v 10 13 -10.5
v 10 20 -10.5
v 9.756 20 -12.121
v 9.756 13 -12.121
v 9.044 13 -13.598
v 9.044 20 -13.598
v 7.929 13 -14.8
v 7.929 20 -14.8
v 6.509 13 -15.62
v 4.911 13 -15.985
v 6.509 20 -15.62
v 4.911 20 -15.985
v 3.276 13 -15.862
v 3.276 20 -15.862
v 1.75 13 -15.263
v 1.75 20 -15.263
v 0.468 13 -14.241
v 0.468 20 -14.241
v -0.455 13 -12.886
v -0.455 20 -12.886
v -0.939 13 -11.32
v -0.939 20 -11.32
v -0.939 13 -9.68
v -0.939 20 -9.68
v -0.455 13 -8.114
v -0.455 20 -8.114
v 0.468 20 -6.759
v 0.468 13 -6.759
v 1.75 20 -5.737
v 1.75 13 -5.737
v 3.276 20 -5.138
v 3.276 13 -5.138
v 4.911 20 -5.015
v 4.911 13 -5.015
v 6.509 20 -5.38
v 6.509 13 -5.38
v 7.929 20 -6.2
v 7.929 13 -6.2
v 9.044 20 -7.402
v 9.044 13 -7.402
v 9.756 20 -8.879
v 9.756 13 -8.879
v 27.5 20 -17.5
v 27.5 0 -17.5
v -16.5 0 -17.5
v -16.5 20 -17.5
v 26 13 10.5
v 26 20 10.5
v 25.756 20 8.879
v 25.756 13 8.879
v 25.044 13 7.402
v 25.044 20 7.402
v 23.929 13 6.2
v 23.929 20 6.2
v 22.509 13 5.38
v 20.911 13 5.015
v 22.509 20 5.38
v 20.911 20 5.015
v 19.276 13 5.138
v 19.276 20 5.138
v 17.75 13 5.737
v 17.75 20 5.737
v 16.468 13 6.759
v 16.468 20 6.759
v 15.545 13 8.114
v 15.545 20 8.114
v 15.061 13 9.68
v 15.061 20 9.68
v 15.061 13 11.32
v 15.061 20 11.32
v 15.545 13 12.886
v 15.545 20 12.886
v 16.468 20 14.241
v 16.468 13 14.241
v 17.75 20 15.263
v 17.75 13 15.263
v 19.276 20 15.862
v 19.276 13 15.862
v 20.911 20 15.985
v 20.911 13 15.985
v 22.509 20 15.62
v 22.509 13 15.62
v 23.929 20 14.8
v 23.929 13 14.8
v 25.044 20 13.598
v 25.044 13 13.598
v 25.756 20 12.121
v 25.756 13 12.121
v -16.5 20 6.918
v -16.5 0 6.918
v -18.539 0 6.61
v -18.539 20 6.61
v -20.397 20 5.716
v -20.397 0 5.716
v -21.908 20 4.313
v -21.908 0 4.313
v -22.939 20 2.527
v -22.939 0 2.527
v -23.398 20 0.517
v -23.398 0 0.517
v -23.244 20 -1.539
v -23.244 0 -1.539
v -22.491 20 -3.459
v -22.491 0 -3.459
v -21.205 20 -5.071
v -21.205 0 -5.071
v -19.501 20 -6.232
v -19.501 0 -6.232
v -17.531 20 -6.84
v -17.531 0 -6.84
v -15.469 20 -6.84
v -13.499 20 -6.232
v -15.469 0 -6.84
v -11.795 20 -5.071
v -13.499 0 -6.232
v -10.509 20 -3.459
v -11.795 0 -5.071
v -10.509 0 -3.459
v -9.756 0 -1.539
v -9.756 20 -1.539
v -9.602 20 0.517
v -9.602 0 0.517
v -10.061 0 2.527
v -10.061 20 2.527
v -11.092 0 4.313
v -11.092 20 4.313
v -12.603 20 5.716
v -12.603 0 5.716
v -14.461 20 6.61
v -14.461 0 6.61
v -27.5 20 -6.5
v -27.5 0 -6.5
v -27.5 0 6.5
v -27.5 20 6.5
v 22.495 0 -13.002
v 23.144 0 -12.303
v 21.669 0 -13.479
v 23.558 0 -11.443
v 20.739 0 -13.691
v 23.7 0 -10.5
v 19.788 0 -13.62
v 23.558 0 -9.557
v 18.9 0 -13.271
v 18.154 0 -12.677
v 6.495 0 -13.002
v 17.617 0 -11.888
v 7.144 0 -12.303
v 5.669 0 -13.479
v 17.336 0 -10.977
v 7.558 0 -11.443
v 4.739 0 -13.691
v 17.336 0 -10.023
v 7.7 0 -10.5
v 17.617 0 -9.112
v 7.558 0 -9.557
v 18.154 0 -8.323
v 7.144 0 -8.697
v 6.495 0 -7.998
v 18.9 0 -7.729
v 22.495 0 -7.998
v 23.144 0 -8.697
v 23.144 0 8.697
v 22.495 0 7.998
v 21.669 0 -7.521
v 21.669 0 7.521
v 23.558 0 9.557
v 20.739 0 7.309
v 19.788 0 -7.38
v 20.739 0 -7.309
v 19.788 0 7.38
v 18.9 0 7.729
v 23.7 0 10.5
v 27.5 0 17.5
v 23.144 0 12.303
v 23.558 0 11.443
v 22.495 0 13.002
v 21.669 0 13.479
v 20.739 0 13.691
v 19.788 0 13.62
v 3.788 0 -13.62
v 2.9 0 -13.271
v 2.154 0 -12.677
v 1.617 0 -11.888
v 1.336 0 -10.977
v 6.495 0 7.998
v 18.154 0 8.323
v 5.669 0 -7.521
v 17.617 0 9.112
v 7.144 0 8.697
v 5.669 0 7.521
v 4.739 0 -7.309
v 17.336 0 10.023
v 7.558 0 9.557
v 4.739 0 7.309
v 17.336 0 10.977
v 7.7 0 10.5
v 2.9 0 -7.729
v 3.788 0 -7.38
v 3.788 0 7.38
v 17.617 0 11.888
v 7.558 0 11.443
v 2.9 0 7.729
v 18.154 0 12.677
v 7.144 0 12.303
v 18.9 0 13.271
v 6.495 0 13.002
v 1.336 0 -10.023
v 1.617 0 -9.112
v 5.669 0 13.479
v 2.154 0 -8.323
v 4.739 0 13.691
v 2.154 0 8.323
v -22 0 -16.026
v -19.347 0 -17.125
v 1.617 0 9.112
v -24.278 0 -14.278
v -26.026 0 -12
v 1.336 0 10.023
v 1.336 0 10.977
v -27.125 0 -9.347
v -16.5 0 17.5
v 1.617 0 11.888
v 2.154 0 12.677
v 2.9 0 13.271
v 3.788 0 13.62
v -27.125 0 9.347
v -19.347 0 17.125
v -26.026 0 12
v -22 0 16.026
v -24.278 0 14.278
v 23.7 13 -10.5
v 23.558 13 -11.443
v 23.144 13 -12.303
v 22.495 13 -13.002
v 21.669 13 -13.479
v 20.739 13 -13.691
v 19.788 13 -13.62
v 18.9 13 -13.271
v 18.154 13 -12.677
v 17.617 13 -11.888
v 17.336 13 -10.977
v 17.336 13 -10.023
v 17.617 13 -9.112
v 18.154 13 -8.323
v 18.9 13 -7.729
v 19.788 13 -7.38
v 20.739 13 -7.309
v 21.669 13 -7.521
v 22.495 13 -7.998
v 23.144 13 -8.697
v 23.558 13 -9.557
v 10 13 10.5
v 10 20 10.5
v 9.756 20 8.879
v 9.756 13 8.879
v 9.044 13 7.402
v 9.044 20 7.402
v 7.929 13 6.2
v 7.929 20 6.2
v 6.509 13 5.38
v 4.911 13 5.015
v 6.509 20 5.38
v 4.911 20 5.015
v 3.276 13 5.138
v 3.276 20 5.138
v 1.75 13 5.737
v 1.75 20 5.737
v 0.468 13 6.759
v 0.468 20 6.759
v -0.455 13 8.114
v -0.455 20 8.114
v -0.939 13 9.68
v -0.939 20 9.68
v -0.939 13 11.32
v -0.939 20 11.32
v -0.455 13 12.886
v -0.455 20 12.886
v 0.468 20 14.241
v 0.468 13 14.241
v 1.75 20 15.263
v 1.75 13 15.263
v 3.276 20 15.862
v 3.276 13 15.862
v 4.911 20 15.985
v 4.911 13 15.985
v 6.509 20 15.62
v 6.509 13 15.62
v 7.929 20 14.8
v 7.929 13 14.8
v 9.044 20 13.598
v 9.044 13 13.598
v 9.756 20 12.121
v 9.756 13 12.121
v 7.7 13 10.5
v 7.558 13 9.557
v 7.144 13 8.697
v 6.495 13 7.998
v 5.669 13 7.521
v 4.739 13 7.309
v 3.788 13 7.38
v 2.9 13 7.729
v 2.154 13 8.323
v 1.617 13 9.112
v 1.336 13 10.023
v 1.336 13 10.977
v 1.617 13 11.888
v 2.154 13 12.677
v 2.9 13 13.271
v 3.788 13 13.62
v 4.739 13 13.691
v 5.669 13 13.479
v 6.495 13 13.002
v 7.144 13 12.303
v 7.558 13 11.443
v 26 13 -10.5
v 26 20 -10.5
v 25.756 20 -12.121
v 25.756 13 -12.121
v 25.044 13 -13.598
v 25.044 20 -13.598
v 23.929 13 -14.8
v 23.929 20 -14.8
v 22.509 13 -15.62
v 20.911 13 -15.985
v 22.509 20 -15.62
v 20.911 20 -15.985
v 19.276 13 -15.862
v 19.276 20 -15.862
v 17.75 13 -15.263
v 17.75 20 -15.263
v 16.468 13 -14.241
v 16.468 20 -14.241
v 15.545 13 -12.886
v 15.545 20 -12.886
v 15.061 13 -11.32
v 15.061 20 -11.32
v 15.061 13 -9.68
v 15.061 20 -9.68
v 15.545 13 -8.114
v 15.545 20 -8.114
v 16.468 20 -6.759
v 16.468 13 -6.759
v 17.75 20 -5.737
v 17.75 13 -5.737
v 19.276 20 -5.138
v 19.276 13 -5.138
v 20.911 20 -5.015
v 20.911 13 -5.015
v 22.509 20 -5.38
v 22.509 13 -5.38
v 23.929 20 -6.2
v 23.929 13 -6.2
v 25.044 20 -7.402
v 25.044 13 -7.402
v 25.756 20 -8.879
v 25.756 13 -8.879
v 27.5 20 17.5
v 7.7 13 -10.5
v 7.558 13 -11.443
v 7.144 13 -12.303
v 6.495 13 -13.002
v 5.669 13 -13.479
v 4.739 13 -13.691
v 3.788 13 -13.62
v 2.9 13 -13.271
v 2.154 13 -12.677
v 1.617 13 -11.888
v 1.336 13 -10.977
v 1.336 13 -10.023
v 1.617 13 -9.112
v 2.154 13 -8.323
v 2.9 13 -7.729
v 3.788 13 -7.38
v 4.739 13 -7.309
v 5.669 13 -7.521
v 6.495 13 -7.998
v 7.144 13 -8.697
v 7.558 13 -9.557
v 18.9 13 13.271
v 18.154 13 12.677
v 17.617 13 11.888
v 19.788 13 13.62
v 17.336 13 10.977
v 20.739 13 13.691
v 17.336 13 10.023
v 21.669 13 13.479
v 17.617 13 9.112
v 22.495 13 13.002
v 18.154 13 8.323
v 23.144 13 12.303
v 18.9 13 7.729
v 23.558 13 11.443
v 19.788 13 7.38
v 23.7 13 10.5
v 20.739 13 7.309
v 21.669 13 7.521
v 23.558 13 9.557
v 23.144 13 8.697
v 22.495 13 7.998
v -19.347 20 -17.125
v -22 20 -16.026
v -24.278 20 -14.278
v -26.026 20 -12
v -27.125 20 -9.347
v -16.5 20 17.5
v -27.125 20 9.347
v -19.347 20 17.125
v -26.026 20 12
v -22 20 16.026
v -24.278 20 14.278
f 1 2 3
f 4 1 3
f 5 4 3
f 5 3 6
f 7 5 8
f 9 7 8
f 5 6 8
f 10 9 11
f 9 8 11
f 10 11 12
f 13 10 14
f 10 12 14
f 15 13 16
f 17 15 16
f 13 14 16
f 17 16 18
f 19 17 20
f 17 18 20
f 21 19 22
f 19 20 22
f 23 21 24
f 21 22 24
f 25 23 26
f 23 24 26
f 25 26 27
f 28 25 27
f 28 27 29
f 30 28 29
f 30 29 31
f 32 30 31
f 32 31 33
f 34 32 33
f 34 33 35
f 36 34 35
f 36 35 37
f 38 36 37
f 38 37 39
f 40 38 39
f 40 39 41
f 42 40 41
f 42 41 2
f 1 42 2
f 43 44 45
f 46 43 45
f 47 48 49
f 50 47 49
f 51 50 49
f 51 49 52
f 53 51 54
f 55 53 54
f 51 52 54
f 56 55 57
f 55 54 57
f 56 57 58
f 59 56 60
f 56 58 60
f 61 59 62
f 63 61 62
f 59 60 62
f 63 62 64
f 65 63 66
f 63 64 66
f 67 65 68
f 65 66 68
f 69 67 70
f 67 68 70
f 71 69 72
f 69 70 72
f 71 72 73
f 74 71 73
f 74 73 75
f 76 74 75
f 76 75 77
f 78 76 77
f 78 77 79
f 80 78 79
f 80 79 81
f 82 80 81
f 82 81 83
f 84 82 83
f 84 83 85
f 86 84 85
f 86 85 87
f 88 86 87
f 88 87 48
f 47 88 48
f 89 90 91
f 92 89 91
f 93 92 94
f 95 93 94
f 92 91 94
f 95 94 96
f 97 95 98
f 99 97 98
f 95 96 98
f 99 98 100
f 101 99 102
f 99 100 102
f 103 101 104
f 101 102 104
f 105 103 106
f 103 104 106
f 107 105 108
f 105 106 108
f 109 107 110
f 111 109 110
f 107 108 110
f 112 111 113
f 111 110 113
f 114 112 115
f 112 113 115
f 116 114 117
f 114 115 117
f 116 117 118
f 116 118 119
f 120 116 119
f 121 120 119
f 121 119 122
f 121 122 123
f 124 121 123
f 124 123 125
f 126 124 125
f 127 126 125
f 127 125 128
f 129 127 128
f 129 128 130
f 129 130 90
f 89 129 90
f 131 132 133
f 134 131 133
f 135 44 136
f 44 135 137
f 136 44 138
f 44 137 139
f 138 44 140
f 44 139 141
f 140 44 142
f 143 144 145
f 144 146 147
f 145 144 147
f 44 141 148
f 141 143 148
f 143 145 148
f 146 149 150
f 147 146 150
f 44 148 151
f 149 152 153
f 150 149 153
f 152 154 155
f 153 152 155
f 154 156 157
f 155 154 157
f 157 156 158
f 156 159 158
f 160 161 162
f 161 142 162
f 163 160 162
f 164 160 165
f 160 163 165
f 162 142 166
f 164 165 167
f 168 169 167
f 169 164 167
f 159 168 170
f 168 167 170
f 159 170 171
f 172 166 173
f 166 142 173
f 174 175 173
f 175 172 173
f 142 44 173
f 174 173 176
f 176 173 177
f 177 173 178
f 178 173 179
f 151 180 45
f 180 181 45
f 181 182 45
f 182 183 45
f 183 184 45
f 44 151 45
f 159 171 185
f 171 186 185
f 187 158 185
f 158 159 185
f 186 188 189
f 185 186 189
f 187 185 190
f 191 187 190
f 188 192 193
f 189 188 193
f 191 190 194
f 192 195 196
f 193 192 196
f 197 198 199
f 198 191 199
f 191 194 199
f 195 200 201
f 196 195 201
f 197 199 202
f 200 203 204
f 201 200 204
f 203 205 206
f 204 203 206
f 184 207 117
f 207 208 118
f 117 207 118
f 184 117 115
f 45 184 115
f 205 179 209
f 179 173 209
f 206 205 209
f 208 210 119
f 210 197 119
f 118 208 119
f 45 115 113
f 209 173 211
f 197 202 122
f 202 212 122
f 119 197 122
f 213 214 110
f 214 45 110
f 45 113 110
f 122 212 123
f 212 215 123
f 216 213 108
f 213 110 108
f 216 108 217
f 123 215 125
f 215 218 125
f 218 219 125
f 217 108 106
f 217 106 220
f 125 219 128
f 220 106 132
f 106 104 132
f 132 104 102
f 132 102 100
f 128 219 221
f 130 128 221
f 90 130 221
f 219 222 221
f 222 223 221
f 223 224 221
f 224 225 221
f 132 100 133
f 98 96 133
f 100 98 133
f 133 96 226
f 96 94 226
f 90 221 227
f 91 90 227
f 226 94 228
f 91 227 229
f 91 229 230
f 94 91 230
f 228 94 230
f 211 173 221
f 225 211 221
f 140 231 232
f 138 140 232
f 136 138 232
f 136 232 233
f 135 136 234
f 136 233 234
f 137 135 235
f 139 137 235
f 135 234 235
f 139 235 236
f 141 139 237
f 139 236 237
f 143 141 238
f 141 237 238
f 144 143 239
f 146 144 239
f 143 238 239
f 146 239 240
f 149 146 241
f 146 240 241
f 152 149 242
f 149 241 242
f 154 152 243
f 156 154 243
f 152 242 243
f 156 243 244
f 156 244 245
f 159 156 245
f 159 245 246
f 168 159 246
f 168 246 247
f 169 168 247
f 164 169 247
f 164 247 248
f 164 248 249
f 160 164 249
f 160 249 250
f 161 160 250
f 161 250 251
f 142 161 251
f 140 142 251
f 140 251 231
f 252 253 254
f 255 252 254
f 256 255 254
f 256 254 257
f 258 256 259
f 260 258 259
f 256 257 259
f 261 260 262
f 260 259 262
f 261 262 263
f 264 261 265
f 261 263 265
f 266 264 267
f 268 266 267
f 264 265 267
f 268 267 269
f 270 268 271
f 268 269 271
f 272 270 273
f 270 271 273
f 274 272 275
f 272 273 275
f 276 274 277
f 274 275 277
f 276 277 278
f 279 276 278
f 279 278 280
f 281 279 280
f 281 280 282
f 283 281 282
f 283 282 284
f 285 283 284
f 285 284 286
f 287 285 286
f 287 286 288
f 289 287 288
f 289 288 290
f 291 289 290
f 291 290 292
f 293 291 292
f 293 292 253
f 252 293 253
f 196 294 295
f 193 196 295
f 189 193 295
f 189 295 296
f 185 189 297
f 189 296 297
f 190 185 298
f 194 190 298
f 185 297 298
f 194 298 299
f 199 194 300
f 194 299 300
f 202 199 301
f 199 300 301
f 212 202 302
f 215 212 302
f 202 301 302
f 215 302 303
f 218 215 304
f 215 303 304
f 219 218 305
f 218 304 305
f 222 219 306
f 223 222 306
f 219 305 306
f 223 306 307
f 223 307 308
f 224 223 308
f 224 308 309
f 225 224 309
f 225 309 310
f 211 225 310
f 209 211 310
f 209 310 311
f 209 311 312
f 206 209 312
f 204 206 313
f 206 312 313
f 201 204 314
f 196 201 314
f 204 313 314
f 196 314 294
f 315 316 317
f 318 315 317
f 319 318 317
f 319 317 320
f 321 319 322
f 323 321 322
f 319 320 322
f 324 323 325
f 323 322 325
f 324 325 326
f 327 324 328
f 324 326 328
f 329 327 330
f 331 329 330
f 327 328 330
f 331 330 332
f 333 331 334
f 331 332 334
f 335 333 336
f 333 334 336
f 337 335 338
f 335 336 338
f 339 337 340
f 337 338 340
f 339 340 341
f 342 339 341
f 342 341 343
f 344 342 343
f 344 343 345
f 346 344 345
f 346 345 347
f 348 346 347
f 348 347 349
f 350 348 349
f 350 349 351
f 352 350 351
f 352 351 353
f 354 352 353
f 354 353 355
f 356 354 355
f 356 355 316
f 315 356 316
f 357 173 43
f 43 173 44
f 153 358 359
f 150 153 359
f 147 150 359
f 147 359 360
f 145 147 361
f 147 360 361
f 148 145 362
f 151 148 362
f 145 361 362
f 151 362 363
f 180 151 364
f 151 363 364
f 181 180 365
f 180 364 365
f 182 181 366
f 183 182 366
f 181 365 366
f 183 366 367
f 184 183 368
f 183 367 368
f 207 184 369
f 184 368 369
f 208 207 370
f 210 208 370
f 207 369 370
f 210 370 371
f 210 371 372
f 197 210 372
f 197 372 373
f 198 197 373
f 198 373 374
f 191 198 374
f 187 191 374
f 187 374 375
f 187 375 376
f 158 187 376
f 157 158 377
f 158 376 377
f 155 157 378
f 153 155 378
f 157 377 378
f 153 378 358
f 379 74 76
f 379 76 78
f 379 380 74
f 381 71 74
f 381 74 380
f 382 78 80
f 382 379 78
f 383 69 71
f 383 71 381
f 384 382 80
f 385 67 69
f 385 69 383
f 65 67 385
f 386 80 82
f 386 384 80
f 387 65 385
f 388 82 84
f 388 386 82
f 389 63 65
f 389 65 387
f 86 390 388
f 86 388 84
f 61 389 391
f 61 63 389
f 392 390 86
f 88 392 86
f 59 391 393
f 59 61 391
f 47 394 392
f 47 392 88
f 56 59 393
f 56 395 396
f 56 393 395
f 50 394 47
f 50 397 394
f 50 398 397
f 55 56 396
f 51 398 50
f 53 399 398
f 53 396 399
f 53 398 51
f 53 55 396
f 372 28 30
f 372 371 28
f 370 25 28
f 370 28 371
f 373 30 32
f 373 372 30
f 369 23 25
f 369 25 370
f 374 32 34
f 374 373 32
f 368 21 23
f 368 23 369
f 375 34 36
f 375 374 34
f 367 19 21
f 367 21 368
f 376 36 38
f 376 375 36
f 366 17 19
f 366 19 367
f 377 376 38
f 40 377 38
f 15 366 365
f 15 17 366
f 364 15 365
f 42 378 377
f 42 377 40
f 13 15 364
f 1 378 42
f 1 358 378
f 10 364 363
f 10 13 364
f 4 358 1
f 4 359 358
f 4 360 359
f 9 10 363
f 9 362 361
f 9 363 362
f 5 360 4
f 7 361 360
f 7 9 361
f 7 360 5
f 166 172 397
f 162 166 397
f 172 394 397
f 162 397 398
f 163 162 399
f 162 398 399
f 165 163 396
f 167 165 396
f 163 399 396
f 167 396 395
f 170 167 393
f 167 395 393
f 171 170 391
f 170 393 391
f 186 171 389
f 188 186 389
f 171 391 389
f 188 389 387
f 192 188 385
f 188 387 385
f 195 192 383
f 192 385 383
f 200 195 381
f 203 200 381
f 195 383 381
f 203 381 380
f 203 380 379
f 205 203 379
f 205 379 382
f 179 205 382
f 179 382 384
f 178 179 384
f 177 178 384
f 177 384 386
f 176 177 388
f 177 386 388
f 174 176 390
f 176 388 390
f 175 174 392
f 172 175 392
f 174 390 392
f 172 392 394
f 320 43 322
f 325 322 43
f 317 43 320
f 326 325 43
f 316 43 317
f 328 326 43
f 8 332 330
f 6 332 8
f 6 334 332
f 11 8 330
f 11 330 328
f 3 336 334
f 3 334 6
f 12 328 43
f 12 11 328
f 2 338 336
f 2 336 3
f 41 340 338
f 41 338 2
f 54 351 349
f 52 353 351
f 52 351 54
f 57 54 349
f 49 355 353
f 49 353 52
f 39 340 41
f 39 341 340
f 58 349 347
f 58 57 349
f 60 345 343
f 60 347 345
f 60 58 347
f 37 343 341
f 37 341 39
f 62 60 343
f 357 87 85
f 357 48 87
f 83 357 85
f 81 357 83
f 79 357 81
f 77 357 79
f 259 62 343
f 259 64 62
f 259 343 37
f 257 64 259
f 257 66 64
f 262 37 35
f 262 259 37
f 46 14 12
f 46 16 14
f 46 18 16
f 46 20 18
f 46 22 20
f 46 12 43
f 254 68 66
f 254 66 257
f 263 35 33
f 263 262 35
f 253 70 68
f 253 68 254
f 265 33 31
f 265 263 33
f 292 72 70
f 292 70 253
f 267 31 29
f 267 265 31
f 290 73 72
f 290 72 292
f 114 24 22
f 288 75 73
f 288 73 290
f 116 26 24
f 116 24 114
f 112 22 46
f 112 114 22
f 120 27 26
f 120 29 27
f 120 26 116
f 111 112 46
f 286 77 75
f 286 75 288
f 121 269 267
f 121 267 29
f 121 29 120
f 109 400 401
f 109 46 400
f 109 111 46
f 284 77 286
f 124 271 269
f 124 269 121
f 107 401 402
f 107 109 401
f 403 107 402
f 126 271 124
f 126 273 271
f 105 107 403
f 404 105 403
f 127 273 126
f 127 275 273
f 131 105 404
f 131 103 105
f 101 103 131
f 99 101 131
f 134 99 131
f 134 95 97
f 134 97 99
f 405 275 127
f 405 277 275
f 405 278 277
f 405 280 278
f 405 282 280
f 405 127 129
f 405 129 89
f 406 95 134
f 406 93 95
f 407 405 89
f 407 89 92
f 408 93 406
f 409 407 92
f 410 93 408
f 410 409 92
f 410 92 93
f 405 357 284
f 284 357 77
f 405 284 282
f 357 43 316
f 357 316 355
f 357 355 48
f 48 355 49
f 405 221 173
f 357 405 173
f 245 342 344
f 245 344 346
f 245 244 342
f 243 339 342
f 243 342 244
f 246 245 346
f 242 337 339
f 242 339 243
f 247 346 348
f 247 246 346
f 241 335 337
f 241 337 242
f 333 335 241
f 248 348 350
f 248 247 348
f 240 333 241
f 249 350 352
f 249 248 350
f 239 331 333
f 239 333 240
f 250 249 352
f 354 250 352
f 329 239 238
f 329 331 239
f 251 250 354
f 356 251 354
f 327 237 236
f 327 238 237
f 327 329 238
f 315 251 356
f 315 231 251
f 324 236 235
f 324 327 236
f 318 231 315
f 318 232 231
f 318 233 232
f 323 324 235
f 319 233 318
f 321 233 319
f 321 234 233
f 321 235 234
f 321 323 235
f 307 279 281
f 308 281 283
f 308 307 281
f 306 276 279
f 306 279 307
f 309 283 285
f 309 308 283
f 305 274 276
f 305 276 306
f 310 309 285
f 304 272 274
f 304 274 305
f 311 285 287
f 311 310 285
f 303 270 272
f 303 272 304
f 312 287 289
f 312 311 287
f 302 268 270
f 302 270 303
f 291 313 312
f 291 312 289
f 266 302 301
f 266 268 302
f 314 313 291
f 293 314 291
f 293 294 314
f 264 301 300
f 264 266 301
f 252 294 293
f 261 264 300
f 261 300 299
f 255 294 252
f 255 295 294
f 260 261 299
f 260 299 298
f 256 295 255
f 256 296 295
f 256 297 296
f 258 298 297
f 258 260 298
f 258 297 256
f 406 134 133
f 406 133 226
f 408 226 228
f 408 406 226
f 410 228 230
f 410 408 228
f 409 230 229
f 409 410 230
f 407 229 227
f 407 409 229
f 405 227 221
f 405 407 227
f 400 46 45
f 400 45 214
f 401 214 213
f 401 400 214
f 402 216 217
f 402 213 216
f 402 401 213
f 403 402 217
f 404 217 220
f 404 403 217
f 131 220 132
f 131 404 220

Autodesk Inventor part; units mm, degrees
ref_plane "YZ Plane" through (0, 0, 0) normal (1, 0, 0) x (0, 1, 0)
ref_plane "XZ Plane" through (0, 0, 0) normal (0, 1, 0) x (-1, 0, 0)
ref_plane "XY Plane" through (0, 0, 0) normal (0, 0, 1) x (1, 0, 0)
sketch "Sketch1" plane through (0, 0, 0) normal (0, 1, 0) x (-1, 0, 0)
  line L0 (27.5, 17.5) -> (-27.5, 17.5)
  line L1 (-27.5, 17.5) -> (-27.5, -17.5)
  line L2 (-27.5, -17.5) -> (27.5, -17.5)
  line L3 (27.5, -17.5) -> (27.5, 17.5)
  line L4 (27.5, 17.5) -> (-27.5, -17.5) construction
  line L5 (-27.5, 17.5) -> (27.5, -17.5) construction
  point P0 (0, 0)
  dimension "d0" = 55
  dimension "d1" = 35
extrude "Extrusion1" add sketch "Sketch1" along normal blind 20
sketch "Sketch2" plane through (0, 20, 0) normal (0, 1, 0) x (1, 0, 0)
  circle A0 centre (20.5, 10.5) radius 5.5
  circle A1 centre (20.5, -10.5) radius 5.5
  circle A2 centre (4.5, -10.5) radius 5.5
  circle A3 centre (4.5, 10.5) radius 5.5
  line L0 (27.5, -17.5) -> (27.5, 17.5) projected
  point P0 (0, 0)
  dimension "d4" = 11
  dimension "d5" = 11
  dimension "d6" = 11
  dimension "d7" = 11
  dimension "d8" = 21
  dimension "d9" = 21
  dimension "d10" = 10.5
  dimension "d11" = 10.5
  dimension "d12" = 23
  dimension "d13" = 23
  dimension "d14" = 7
  dimension "d15" = 7
extrude "Extrusion2" cut sketch "Sketch2" against normal blind 7
sketch "Sketch3" plane through (4.5, 13, 10.5) normal (0, 1, 0) x (1, 0, 0)
  circle A0 centre (0, 0) radius 3.2
  circle A1 centre (0, 21) radius 5.5 projected
  circle A2 centre (16, 21) radius 5.5 projected
  circle A3 centre (16, 0) radius 5.5 projected
  circle A4 centre (0, 21) radius 3.2
  circle A5 centre (16, 21) radius 3.2
  circle A6 centre (16, 0) radius 3.2
  point P0 (-4.5, 10.5)
  dimension "d18" = 6.4
  dimension "d19" = 6.4
  dimension "d20" = 6.4
  dimension "d21" = 6.4
extrude "Extrusion3" cut sketch "Sketch3" against normal blind 20 contours A0 | A4 | A5 | A6
sketch "Sketch4" plane through (0, 20, 0) normal (0, 1, 0) x (1, 0, 0)
  line L0 (27.5, -17.5) -> (27.5, 17.5) projected
  point P0 (0, 0)
  point P1 (-16.5, 0)
  dimension "d27" = 44
fillet "Fillet1" radius 11 2 edges at (-27.5, 10, 17.5) (-27.5, 10, -17.5)
hole "Hole1" at (-16.5, 20, 0) direction (0, -1, 0) diameter 13.835 depth 41.3 tip angle 118 thread size "M16x2" class "6H" standard "ISO Metric profile"
properties part number "Spindlesocket"
